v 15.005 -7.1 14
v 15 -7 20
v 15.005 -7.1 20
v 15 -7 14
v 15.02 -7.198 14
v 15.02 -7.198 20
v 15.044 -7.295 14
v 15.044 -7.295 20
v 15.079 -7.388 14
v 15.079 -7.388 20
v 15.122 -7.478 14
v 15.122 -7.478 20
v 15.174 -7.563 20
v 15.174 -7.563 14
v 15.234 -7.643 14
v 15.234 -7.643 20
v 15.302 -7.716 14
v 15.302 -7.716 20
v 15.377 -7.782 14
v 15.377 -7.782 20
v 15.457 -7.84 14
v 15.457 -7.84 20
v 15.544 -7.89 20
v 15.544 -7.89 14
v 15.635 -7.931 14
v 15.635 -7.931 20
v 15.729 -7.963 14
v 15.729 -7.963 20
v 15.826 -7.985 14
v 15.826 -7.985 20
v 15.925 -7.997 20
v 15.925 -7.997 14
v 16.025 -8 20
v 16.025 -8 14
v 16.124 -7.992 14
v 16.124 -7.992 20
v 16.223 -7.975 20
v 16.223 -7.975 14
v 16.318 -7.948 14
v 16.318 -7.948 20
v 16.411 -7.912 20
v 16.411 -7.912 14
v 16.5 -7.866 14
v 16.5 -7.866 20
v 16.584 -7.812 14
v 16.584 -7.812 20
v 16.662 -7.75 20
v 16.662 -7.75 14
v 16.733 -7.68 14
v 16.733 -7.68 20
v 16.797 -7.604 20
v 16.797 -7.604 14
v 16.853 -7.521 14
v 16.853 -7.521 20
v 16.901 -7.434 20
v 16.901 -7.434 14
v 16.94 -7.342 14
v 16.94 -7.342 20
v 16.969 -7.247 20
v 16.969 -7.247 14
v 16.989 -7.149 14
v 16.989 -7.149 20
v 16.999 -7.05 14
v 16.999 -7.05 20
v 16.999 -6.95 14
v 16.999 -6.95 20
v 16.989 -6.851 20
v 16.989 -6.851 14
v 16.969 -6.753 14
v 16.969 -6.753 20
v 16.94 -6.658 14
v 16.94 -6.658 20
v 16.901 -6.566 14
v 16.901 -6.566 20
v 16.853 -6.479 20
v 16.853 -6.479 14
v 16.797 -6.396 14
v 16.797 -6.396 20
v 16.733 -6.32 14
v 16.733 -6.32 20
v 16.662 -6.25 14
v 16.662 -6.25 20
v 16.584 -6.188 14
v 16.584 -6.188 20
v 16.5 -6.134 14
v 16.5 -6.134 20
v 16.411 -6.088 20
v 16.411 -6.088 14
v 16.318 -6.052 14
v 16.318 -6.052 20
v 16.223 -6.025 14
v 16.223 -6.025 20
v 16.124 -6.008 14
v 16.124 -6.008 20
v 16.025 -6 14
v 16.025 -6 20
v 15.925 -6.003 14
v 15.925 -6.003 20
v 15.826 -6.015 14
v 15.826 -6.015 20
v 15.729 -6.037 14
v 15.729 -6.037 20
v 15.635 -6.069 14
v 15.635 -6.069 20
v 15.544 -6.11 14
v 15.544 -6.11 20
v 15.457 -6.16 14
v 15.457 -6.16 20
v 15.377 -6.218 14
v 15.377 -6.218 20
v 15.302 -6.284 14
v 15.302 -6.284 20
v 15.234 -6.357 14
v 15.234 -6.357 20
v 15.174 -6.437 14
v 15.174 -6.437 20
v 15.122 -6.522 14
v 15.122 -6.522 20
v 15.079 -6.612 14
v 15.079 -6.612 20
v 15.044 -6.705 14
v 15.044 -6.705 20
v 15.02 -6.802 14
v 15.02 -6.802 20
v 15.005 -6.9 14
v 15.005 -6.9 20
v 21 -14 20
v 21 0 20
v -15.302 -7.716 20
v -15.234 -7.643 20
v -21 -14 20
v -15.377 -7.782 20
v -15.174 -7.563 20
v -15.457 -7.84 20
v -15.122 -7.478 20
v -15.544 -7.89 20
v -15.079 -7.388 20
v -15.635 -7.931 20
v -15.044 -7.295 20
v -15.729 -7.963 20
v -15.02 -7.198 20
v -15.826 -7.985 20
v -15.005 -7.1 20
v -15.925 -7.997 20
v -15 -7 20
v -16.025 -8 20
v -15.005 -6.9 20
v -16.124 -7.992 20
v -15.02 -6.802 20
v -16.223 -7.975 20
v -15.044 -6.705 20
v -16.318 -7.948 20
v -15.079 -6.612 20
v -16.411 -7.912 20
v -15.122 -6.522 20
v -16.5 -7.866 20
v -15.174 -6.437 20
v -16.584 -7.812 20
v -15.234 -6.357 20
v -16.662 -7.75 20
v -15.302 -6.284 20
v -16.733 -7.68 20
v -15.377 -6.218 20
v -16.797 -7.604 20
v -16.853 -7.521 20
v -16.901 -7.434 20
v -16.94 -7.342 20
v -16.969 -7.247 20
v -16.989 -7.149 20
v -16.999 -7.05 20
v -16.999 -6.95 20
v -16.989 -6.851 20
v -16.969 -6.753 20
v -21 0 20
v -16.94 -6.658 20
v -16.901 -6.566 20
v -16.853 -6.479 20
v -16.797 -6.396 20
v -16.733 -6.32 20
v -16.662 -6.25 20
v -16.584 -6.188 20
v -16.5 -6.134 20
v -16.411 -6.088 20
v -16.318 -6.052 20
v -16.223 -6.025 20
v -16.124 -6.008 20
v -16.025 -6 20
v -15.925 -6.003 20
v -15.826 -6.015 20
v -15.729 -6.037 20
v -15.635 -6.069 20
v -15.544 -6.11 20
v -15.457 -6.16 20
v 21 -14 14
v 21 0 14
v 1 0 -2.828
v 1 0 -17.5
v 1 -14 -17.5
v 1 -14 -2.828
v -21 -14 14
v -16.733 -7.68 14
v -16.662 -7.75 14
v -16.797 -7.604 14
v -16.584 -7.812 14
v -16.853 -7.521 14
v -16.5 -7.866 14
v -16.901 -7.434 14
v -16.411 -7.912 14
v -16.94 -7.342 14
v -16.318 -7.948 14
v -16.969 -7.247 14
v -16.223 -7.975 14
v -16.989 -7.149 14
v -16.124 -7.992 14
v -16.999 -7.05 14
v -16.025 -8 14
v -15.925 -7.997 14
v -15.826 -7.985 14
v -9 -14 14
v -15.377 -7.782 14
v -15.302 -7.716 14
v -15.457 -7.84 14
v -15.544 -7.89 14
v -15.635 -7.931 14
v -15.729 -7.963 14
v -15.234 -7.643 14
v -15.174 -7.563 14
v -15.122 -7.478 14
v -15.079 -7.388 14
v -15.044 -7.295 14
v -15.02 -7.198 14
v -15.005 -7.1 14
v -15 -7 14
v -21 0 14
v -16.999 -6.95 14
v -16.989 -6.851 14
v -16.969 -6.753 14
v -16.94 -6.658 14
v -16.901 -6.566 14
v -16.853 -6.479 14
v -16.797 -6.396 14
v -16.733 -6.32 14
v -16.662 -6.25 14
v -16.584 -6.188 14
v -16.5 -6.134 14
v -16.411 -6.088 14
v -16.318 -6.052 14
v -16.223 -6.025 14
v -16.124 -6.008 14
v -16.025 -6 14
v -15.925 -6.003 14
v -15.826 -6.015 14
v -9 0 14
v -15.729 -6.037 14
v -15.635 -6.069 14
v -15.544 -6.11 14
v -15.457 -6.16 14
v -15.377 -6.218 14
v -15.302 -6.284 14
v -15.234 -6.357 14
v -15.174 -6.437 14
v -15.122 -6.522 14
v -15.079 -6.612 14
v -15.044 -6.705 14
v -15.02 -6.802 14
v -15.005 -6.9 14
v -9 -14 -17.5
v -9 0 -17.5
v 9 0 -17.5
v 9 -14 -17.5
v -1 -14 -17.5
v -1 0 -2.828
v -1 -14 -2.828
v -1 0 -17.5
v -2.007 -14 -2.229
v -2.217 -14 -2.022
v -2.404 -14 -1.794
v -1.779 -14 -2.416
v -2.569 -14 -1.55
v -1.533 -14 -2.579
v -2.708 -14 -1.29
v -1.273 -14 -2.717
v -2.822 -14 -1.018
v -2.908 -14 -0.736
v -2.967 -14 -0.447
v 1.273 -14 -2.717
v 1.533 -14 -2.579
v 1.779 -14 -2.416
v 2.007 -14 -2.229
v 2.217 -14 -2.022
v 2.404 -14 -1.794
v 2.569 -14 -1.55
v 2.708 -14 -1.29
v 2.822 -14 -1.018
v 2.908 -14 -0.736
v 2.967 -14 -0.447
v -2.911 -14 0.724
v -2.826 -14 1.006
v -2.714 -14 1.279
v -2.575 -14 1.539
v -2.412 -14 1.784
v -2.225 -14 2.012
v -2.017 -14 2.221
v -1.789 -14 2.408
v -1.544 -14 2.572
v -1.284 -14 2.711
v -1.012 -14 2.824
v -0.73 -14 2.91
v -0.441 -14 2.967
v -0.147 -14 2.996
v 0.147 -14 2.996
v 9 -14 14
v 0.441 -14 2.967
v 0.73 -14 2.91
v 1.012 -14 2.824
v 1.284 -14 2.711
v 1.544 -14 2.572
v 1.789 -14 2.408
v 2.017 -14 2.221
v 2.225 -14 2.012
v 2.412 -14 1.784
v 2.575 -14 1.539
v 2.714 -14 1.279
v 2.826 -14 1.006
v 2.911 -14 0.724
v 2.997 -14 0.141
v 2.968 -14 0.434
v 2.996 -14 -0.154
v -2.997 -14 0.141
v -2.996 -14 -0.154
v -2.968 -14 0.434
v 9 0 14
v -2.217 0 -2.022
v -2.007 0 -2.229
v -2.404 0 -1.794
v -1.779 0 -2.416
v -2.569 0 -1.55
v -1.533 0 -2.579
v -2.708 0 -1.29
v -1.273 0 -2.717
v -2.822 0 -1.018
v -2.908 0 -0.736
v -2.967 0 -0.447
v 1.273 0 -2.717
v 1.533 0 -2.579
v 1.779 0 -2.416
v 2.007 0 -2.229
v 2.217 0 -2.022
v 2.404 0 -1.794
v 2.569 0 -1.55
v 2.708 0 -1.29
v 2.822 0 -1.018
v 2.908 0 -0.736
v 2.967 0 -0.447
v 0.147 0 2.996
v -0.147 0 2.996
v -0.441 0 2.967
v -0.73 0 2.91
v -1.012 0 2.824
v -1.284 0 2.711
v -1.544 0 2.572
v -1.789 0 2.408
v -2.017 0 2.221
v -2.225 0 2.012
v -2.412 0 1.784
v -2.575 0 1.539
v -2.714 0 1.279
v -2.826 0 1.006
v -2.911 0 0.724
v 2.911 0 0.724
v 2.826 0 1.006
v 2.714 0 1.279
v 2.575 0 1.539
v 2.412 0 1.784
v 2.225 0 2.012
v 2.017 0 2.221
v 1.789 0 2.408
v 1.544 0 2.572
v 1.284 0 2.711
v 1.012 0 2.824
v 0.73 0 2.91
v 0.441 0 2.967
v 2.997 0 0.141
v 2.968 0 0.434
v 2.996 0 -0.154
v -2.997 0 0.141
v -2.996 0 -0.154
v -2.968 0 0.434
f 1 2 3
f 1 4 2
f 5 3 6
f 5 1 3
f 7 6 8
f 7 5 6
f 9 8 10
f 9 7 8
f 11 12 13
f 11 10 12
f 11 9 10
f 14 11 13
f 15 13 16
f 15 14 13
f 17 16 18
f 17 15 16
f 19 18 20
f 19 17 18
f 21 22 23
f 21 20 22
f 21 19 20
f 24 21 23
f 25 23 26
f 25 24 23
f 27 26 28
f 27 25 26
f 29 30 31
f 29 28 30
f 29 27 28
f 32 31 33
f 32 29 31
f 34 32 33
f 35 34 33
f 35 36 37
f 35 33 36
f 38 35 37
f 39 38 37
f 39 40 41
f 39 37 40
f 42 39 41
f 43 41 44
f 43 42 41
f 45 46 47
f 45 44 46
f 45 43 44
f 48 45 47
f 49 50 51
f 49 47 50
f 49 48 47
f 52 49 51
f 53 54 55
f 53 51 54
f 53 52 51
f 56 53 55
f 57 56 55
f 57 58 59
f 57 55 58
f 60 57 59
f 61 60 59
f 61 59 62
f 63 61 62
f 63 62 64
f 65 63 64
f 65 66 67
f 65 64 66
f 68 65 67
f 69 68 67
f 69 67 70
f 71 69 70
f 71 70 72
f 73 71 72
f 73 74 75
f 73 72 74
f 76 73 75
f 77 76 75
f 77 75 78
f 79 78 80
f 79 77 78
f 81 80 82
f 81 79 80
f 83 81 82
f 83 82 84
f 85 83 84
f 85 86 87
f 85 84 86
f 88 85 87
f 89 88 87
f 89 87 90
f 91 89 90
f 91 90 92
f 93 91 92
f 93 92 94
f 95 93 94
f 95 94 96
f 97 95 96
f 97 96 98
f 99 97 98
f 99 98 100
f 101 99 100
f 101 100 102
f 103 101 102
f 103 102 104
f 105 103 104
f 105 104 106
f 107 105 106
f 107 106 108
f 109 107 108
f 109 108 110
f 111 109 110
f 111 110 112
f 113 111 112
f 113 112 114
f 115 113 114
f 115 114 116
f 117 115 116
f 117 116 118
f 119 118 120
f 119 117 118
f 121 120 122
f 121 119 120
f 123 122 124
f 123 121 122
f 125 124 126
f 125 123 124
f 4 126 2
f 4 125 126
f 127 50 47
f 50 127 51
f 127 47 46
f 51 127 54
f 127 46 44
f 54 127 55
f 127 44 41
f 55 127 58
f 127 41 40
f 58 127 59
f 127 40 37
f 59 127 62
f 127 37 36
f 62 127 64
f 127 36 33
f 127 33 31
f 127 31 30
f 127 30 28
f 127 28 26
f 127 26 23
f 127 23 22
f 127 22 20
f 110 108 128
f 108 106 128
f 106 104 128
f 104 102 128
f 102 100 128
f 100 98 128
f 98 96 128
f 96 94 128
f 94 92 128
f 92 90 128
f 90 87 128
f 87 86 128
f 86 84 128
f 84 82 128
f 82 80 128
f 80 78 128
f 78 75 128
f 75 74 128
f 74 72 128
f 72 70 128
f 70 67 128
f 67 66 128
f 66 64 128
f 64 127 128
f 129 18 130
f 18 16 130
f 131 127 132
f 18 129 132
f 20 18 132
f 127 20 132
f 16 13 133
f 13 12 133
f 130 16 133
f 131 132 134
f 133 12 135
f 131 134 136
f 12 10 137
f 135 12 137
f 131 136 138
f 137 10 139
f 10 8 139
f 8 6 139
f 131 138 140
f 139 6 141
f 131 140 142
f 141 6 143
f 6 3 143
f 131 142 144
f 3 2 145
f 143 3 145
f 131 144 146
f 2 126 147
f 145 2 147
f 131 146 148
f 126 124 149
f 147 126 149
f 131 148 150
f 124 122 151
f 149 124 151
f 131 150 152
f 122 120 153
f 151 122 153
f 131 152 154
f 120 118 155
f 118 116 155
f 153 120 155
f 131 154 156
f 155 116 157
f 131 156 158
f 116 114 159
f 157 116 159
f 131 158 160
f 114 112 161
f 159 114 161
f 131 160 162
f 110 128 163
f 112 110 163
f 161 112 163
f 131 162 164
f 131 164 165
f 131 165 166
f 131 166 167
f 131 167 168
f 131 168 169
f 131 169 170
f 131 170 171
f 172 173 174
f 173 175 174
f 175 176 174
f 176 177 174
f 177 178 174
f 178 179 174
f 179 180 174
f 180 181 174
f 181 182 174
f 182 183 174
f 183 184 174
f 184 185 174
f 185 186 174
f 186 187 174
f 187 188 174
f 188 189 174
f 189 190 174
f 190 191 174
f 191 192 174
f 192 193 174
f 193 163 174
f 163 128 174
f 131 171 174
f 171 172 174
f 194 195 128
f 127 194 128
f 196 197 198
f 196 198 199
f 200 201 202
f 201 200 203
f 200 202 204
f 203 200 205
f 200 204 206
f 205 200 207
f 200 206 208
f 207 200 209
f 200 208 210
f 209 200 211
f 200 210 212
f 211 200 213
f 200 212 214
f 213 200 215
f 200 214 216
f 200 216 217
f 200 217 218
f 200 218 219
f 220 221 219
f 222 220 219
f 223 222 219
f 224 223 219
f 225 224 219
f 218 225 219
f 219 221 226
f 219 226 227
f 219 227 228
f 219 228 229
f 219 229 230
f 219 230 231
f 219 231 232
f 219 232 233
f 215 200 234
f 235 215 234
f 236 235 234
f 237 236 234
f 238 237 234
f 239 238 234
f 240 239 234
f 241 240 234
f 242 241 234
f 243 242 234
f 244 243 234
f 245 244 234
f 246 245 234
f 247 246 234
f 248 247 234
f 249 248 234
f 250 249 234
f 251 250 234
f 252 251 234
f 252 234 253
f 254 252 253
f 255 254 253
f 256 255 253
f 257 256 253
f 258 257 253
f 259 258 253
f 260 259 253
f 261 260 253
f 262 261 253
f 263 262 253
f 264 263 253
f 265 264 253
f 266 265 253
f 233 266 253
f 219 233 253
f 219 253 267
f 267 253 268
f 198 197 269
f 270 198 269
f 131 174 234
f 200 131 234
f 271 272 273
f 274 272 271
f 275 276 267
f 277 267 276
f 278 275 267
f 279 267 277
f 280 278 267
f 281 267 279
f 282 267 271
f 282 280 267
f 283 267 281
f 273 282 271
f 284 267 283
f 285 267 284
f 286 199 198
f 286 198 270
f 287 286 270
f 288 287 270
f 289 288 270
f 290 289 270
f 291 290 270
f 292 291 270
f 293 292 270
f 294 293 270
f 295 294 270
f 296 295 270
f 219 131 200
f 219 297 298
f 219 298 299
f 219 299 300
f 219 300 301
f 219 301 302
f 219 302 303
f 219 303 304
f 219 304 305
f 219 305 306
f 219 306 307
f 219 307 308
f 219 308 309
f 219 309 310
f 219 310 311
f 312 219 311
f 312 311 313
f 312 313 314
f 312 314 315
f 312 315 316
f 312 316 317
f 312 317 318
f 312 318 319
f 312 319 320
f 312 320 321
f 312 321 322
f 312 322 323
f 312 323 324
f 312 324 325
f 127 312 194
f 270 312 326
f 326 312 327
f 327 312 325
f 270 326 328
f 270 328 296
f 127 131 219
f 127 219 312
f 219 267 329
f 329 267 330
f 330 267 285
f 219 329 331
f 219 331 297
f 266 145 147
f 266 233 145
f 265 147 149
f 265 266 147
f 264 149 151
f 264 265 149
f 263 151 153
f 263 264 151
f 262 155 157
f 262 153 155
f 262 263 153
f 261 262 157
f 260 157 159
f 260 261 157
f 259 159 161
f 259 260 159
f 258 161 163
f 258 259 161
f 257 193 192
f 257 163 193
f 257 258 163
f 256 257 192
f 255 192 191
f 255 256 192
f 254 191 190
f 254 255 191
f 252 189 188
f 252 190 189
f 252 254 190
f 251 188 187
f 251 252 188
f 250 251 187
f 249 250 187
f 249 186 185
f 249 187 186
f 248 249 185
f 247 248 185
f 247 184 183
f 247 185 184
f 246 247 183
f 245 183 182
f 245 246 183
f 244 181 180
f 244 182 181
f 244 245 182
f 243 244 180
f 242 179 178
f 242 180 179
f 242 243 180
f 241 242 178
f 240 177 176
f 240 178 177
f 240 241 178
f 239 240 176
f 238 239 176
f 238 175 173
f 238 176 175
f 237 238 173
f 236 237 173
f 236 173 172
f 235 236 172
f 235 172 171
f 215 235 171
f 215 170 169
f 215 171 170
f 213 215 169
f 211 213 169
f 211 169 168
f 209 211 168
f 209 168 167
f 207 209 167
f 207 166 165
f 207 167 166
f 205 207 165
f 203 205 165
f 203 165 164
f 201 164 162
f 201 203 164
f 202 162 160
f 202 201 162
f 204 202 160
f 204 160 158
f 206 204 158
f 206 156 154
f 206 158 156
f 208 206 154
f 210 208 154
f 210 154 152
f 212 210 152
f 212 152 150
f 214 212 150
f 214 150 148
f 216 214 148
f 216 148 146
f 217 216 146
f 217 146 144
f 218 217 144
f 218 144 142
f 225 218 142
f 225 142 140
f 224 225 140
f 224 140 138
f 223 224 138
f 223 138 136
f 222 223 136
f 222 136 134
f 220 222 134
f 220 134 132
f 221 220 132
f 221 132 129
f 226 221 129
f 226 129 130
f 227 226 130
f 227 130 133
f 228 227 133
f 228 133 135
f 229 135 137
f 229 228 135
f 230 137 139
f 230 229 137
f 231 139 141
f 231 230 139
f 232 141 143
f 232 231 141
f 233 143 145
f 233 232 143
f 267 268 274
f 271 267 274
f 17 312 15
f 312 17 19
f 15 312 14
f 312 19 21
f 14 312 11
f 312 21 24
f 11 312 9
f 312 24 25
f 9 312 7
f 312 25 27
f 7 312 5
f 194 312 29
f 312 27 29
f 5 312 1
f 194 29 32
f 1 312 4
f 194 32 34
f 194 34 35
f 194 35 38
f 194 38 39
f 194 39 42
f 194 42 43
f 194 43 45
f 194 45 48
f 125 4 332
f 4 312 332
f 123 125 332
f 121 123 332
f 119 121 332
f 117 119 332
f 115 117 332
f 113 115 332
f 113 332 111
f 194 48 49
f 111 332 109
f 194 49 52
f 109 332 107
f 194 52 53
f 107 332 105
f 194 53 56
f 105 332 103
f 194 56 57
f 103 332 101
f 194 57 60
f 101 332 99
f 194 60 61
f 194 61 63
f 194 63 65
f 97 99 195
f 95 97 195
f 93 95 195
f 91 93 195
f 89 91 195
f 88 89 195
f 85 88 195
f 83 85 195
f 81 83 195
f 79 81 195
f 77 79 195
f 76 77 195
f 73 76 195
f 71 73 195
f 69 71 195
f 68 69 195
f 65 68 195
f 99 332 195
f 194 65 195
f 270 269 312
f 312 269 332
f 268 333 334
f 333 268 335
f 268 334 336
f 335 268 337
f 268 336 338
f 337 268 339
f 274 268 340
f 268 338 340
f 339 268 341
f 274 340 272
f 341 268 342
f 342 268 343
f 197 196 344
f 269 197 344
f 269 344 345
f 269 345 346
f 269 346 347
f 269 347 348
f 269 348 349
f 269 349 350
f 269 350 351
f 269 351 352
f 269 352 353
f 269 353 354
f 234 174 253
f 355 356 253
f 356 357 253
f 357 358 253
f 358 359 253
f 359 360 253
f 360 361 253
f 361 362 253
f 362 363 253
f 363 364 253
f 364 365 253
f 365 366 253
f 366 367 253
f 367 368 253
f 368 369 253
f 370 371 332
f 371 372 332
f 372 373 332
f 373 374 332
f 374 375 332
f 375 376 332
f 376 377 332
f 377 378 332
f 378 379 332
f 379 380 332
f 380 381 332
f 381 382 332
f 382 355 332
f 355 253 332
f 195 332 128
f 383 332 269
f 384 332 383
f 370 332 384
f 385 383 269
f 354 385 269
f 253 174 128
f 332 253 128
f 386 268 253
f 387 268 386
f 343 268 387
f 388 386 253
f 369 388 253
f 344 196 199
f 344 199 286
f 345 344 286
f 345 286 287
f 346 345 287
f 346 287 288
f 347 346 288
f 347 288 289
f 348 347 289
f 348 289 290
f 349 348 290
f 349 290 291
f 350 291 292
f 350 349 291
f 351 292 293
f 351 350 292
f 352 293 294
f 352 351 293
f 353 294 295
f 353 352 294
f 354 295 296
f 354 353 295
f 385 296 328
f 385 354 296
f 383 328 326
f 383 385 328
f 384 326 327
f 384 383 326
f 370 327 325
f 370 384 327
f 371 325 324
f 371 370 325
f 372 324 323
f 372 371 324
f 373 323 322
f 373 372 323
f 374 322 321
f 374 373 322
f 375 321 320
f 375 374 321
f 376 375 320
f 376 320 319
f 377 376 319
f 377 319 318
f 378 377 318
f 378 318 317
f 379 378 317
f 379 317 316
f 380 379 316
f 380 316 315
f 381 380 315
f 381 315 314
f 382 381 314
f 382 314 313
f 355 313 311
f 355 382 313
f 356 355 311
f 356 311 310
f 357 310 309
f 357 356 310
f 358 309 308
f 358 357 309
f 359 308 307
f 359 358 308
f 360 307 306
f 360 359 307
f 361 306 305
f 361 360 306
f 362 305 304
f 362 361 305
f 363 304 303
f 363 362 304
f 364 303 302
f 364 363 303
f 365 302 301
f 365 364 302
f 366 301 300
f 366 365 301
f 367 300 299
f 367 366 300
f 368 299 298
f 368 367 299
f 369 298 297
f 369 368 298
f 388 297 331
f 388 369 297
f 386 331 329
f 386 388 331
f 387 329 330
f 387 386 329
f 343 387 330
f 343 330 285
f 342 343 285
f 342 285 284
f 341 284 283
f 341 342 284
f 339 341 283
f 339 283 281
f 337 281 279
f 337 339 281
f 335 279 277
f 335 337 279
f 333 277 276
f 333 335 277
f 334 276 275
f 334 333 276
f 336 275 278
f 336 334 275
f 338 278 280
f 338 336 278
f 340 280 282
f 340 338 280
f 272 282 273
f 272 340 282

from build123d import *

# Parameters (mm, degrees)
F0_R     = 3
F1_DEPTH = 14
F3_DEPTH = 25
F4_R     = 1
F5_DEPTH = 20.001


with BuildPart() as f1:
    # F0 (on Front) → F1 (new body)
    with BuildSketch(Plane.XZ):
        Polygon((21, 20), (-21, 20), (-21, 14), (-9, 14), (-9, -17.5), (9, -17.5), (9, 14), (21, 14), align=None)
        Circle(F0_R, mode=Mode.SUBTRACT)
    extrude(amount=F1_DEPTH)

    # F2 (on Front) → F3 (cut)
    with BuildSketch(Plane.XZ):
        with BuildLine():
            Line((-1, -17.5), (1, -17.5))
            Line((1, -17.5), (1, -2.828427))
            ThreePointArc((1, -2.828427), (0, -3), (-1, -2.828427))
            Line((-1, -2.828427), (-1, -17.5))
        make_face()
    extrude(amount=F3_DEPTH, mode=Mode.SUBTRACT)

    # F4 (on Top) → F5 (cut, through all)
    with BuildSketch(Plane.XY):
        with Locations((-16, -7)):
            Circle(F4_R)
        with BuildLine():
            ThreePointArc((17, -7), (16, -6), (15, -7))
            ThreePointArc((15, -7), (16, -8), (17, -7))
        make_face()
    extrude(amount=F5_DEPTH, mode=Mode.SUBTRACT)


solid = f1.part
